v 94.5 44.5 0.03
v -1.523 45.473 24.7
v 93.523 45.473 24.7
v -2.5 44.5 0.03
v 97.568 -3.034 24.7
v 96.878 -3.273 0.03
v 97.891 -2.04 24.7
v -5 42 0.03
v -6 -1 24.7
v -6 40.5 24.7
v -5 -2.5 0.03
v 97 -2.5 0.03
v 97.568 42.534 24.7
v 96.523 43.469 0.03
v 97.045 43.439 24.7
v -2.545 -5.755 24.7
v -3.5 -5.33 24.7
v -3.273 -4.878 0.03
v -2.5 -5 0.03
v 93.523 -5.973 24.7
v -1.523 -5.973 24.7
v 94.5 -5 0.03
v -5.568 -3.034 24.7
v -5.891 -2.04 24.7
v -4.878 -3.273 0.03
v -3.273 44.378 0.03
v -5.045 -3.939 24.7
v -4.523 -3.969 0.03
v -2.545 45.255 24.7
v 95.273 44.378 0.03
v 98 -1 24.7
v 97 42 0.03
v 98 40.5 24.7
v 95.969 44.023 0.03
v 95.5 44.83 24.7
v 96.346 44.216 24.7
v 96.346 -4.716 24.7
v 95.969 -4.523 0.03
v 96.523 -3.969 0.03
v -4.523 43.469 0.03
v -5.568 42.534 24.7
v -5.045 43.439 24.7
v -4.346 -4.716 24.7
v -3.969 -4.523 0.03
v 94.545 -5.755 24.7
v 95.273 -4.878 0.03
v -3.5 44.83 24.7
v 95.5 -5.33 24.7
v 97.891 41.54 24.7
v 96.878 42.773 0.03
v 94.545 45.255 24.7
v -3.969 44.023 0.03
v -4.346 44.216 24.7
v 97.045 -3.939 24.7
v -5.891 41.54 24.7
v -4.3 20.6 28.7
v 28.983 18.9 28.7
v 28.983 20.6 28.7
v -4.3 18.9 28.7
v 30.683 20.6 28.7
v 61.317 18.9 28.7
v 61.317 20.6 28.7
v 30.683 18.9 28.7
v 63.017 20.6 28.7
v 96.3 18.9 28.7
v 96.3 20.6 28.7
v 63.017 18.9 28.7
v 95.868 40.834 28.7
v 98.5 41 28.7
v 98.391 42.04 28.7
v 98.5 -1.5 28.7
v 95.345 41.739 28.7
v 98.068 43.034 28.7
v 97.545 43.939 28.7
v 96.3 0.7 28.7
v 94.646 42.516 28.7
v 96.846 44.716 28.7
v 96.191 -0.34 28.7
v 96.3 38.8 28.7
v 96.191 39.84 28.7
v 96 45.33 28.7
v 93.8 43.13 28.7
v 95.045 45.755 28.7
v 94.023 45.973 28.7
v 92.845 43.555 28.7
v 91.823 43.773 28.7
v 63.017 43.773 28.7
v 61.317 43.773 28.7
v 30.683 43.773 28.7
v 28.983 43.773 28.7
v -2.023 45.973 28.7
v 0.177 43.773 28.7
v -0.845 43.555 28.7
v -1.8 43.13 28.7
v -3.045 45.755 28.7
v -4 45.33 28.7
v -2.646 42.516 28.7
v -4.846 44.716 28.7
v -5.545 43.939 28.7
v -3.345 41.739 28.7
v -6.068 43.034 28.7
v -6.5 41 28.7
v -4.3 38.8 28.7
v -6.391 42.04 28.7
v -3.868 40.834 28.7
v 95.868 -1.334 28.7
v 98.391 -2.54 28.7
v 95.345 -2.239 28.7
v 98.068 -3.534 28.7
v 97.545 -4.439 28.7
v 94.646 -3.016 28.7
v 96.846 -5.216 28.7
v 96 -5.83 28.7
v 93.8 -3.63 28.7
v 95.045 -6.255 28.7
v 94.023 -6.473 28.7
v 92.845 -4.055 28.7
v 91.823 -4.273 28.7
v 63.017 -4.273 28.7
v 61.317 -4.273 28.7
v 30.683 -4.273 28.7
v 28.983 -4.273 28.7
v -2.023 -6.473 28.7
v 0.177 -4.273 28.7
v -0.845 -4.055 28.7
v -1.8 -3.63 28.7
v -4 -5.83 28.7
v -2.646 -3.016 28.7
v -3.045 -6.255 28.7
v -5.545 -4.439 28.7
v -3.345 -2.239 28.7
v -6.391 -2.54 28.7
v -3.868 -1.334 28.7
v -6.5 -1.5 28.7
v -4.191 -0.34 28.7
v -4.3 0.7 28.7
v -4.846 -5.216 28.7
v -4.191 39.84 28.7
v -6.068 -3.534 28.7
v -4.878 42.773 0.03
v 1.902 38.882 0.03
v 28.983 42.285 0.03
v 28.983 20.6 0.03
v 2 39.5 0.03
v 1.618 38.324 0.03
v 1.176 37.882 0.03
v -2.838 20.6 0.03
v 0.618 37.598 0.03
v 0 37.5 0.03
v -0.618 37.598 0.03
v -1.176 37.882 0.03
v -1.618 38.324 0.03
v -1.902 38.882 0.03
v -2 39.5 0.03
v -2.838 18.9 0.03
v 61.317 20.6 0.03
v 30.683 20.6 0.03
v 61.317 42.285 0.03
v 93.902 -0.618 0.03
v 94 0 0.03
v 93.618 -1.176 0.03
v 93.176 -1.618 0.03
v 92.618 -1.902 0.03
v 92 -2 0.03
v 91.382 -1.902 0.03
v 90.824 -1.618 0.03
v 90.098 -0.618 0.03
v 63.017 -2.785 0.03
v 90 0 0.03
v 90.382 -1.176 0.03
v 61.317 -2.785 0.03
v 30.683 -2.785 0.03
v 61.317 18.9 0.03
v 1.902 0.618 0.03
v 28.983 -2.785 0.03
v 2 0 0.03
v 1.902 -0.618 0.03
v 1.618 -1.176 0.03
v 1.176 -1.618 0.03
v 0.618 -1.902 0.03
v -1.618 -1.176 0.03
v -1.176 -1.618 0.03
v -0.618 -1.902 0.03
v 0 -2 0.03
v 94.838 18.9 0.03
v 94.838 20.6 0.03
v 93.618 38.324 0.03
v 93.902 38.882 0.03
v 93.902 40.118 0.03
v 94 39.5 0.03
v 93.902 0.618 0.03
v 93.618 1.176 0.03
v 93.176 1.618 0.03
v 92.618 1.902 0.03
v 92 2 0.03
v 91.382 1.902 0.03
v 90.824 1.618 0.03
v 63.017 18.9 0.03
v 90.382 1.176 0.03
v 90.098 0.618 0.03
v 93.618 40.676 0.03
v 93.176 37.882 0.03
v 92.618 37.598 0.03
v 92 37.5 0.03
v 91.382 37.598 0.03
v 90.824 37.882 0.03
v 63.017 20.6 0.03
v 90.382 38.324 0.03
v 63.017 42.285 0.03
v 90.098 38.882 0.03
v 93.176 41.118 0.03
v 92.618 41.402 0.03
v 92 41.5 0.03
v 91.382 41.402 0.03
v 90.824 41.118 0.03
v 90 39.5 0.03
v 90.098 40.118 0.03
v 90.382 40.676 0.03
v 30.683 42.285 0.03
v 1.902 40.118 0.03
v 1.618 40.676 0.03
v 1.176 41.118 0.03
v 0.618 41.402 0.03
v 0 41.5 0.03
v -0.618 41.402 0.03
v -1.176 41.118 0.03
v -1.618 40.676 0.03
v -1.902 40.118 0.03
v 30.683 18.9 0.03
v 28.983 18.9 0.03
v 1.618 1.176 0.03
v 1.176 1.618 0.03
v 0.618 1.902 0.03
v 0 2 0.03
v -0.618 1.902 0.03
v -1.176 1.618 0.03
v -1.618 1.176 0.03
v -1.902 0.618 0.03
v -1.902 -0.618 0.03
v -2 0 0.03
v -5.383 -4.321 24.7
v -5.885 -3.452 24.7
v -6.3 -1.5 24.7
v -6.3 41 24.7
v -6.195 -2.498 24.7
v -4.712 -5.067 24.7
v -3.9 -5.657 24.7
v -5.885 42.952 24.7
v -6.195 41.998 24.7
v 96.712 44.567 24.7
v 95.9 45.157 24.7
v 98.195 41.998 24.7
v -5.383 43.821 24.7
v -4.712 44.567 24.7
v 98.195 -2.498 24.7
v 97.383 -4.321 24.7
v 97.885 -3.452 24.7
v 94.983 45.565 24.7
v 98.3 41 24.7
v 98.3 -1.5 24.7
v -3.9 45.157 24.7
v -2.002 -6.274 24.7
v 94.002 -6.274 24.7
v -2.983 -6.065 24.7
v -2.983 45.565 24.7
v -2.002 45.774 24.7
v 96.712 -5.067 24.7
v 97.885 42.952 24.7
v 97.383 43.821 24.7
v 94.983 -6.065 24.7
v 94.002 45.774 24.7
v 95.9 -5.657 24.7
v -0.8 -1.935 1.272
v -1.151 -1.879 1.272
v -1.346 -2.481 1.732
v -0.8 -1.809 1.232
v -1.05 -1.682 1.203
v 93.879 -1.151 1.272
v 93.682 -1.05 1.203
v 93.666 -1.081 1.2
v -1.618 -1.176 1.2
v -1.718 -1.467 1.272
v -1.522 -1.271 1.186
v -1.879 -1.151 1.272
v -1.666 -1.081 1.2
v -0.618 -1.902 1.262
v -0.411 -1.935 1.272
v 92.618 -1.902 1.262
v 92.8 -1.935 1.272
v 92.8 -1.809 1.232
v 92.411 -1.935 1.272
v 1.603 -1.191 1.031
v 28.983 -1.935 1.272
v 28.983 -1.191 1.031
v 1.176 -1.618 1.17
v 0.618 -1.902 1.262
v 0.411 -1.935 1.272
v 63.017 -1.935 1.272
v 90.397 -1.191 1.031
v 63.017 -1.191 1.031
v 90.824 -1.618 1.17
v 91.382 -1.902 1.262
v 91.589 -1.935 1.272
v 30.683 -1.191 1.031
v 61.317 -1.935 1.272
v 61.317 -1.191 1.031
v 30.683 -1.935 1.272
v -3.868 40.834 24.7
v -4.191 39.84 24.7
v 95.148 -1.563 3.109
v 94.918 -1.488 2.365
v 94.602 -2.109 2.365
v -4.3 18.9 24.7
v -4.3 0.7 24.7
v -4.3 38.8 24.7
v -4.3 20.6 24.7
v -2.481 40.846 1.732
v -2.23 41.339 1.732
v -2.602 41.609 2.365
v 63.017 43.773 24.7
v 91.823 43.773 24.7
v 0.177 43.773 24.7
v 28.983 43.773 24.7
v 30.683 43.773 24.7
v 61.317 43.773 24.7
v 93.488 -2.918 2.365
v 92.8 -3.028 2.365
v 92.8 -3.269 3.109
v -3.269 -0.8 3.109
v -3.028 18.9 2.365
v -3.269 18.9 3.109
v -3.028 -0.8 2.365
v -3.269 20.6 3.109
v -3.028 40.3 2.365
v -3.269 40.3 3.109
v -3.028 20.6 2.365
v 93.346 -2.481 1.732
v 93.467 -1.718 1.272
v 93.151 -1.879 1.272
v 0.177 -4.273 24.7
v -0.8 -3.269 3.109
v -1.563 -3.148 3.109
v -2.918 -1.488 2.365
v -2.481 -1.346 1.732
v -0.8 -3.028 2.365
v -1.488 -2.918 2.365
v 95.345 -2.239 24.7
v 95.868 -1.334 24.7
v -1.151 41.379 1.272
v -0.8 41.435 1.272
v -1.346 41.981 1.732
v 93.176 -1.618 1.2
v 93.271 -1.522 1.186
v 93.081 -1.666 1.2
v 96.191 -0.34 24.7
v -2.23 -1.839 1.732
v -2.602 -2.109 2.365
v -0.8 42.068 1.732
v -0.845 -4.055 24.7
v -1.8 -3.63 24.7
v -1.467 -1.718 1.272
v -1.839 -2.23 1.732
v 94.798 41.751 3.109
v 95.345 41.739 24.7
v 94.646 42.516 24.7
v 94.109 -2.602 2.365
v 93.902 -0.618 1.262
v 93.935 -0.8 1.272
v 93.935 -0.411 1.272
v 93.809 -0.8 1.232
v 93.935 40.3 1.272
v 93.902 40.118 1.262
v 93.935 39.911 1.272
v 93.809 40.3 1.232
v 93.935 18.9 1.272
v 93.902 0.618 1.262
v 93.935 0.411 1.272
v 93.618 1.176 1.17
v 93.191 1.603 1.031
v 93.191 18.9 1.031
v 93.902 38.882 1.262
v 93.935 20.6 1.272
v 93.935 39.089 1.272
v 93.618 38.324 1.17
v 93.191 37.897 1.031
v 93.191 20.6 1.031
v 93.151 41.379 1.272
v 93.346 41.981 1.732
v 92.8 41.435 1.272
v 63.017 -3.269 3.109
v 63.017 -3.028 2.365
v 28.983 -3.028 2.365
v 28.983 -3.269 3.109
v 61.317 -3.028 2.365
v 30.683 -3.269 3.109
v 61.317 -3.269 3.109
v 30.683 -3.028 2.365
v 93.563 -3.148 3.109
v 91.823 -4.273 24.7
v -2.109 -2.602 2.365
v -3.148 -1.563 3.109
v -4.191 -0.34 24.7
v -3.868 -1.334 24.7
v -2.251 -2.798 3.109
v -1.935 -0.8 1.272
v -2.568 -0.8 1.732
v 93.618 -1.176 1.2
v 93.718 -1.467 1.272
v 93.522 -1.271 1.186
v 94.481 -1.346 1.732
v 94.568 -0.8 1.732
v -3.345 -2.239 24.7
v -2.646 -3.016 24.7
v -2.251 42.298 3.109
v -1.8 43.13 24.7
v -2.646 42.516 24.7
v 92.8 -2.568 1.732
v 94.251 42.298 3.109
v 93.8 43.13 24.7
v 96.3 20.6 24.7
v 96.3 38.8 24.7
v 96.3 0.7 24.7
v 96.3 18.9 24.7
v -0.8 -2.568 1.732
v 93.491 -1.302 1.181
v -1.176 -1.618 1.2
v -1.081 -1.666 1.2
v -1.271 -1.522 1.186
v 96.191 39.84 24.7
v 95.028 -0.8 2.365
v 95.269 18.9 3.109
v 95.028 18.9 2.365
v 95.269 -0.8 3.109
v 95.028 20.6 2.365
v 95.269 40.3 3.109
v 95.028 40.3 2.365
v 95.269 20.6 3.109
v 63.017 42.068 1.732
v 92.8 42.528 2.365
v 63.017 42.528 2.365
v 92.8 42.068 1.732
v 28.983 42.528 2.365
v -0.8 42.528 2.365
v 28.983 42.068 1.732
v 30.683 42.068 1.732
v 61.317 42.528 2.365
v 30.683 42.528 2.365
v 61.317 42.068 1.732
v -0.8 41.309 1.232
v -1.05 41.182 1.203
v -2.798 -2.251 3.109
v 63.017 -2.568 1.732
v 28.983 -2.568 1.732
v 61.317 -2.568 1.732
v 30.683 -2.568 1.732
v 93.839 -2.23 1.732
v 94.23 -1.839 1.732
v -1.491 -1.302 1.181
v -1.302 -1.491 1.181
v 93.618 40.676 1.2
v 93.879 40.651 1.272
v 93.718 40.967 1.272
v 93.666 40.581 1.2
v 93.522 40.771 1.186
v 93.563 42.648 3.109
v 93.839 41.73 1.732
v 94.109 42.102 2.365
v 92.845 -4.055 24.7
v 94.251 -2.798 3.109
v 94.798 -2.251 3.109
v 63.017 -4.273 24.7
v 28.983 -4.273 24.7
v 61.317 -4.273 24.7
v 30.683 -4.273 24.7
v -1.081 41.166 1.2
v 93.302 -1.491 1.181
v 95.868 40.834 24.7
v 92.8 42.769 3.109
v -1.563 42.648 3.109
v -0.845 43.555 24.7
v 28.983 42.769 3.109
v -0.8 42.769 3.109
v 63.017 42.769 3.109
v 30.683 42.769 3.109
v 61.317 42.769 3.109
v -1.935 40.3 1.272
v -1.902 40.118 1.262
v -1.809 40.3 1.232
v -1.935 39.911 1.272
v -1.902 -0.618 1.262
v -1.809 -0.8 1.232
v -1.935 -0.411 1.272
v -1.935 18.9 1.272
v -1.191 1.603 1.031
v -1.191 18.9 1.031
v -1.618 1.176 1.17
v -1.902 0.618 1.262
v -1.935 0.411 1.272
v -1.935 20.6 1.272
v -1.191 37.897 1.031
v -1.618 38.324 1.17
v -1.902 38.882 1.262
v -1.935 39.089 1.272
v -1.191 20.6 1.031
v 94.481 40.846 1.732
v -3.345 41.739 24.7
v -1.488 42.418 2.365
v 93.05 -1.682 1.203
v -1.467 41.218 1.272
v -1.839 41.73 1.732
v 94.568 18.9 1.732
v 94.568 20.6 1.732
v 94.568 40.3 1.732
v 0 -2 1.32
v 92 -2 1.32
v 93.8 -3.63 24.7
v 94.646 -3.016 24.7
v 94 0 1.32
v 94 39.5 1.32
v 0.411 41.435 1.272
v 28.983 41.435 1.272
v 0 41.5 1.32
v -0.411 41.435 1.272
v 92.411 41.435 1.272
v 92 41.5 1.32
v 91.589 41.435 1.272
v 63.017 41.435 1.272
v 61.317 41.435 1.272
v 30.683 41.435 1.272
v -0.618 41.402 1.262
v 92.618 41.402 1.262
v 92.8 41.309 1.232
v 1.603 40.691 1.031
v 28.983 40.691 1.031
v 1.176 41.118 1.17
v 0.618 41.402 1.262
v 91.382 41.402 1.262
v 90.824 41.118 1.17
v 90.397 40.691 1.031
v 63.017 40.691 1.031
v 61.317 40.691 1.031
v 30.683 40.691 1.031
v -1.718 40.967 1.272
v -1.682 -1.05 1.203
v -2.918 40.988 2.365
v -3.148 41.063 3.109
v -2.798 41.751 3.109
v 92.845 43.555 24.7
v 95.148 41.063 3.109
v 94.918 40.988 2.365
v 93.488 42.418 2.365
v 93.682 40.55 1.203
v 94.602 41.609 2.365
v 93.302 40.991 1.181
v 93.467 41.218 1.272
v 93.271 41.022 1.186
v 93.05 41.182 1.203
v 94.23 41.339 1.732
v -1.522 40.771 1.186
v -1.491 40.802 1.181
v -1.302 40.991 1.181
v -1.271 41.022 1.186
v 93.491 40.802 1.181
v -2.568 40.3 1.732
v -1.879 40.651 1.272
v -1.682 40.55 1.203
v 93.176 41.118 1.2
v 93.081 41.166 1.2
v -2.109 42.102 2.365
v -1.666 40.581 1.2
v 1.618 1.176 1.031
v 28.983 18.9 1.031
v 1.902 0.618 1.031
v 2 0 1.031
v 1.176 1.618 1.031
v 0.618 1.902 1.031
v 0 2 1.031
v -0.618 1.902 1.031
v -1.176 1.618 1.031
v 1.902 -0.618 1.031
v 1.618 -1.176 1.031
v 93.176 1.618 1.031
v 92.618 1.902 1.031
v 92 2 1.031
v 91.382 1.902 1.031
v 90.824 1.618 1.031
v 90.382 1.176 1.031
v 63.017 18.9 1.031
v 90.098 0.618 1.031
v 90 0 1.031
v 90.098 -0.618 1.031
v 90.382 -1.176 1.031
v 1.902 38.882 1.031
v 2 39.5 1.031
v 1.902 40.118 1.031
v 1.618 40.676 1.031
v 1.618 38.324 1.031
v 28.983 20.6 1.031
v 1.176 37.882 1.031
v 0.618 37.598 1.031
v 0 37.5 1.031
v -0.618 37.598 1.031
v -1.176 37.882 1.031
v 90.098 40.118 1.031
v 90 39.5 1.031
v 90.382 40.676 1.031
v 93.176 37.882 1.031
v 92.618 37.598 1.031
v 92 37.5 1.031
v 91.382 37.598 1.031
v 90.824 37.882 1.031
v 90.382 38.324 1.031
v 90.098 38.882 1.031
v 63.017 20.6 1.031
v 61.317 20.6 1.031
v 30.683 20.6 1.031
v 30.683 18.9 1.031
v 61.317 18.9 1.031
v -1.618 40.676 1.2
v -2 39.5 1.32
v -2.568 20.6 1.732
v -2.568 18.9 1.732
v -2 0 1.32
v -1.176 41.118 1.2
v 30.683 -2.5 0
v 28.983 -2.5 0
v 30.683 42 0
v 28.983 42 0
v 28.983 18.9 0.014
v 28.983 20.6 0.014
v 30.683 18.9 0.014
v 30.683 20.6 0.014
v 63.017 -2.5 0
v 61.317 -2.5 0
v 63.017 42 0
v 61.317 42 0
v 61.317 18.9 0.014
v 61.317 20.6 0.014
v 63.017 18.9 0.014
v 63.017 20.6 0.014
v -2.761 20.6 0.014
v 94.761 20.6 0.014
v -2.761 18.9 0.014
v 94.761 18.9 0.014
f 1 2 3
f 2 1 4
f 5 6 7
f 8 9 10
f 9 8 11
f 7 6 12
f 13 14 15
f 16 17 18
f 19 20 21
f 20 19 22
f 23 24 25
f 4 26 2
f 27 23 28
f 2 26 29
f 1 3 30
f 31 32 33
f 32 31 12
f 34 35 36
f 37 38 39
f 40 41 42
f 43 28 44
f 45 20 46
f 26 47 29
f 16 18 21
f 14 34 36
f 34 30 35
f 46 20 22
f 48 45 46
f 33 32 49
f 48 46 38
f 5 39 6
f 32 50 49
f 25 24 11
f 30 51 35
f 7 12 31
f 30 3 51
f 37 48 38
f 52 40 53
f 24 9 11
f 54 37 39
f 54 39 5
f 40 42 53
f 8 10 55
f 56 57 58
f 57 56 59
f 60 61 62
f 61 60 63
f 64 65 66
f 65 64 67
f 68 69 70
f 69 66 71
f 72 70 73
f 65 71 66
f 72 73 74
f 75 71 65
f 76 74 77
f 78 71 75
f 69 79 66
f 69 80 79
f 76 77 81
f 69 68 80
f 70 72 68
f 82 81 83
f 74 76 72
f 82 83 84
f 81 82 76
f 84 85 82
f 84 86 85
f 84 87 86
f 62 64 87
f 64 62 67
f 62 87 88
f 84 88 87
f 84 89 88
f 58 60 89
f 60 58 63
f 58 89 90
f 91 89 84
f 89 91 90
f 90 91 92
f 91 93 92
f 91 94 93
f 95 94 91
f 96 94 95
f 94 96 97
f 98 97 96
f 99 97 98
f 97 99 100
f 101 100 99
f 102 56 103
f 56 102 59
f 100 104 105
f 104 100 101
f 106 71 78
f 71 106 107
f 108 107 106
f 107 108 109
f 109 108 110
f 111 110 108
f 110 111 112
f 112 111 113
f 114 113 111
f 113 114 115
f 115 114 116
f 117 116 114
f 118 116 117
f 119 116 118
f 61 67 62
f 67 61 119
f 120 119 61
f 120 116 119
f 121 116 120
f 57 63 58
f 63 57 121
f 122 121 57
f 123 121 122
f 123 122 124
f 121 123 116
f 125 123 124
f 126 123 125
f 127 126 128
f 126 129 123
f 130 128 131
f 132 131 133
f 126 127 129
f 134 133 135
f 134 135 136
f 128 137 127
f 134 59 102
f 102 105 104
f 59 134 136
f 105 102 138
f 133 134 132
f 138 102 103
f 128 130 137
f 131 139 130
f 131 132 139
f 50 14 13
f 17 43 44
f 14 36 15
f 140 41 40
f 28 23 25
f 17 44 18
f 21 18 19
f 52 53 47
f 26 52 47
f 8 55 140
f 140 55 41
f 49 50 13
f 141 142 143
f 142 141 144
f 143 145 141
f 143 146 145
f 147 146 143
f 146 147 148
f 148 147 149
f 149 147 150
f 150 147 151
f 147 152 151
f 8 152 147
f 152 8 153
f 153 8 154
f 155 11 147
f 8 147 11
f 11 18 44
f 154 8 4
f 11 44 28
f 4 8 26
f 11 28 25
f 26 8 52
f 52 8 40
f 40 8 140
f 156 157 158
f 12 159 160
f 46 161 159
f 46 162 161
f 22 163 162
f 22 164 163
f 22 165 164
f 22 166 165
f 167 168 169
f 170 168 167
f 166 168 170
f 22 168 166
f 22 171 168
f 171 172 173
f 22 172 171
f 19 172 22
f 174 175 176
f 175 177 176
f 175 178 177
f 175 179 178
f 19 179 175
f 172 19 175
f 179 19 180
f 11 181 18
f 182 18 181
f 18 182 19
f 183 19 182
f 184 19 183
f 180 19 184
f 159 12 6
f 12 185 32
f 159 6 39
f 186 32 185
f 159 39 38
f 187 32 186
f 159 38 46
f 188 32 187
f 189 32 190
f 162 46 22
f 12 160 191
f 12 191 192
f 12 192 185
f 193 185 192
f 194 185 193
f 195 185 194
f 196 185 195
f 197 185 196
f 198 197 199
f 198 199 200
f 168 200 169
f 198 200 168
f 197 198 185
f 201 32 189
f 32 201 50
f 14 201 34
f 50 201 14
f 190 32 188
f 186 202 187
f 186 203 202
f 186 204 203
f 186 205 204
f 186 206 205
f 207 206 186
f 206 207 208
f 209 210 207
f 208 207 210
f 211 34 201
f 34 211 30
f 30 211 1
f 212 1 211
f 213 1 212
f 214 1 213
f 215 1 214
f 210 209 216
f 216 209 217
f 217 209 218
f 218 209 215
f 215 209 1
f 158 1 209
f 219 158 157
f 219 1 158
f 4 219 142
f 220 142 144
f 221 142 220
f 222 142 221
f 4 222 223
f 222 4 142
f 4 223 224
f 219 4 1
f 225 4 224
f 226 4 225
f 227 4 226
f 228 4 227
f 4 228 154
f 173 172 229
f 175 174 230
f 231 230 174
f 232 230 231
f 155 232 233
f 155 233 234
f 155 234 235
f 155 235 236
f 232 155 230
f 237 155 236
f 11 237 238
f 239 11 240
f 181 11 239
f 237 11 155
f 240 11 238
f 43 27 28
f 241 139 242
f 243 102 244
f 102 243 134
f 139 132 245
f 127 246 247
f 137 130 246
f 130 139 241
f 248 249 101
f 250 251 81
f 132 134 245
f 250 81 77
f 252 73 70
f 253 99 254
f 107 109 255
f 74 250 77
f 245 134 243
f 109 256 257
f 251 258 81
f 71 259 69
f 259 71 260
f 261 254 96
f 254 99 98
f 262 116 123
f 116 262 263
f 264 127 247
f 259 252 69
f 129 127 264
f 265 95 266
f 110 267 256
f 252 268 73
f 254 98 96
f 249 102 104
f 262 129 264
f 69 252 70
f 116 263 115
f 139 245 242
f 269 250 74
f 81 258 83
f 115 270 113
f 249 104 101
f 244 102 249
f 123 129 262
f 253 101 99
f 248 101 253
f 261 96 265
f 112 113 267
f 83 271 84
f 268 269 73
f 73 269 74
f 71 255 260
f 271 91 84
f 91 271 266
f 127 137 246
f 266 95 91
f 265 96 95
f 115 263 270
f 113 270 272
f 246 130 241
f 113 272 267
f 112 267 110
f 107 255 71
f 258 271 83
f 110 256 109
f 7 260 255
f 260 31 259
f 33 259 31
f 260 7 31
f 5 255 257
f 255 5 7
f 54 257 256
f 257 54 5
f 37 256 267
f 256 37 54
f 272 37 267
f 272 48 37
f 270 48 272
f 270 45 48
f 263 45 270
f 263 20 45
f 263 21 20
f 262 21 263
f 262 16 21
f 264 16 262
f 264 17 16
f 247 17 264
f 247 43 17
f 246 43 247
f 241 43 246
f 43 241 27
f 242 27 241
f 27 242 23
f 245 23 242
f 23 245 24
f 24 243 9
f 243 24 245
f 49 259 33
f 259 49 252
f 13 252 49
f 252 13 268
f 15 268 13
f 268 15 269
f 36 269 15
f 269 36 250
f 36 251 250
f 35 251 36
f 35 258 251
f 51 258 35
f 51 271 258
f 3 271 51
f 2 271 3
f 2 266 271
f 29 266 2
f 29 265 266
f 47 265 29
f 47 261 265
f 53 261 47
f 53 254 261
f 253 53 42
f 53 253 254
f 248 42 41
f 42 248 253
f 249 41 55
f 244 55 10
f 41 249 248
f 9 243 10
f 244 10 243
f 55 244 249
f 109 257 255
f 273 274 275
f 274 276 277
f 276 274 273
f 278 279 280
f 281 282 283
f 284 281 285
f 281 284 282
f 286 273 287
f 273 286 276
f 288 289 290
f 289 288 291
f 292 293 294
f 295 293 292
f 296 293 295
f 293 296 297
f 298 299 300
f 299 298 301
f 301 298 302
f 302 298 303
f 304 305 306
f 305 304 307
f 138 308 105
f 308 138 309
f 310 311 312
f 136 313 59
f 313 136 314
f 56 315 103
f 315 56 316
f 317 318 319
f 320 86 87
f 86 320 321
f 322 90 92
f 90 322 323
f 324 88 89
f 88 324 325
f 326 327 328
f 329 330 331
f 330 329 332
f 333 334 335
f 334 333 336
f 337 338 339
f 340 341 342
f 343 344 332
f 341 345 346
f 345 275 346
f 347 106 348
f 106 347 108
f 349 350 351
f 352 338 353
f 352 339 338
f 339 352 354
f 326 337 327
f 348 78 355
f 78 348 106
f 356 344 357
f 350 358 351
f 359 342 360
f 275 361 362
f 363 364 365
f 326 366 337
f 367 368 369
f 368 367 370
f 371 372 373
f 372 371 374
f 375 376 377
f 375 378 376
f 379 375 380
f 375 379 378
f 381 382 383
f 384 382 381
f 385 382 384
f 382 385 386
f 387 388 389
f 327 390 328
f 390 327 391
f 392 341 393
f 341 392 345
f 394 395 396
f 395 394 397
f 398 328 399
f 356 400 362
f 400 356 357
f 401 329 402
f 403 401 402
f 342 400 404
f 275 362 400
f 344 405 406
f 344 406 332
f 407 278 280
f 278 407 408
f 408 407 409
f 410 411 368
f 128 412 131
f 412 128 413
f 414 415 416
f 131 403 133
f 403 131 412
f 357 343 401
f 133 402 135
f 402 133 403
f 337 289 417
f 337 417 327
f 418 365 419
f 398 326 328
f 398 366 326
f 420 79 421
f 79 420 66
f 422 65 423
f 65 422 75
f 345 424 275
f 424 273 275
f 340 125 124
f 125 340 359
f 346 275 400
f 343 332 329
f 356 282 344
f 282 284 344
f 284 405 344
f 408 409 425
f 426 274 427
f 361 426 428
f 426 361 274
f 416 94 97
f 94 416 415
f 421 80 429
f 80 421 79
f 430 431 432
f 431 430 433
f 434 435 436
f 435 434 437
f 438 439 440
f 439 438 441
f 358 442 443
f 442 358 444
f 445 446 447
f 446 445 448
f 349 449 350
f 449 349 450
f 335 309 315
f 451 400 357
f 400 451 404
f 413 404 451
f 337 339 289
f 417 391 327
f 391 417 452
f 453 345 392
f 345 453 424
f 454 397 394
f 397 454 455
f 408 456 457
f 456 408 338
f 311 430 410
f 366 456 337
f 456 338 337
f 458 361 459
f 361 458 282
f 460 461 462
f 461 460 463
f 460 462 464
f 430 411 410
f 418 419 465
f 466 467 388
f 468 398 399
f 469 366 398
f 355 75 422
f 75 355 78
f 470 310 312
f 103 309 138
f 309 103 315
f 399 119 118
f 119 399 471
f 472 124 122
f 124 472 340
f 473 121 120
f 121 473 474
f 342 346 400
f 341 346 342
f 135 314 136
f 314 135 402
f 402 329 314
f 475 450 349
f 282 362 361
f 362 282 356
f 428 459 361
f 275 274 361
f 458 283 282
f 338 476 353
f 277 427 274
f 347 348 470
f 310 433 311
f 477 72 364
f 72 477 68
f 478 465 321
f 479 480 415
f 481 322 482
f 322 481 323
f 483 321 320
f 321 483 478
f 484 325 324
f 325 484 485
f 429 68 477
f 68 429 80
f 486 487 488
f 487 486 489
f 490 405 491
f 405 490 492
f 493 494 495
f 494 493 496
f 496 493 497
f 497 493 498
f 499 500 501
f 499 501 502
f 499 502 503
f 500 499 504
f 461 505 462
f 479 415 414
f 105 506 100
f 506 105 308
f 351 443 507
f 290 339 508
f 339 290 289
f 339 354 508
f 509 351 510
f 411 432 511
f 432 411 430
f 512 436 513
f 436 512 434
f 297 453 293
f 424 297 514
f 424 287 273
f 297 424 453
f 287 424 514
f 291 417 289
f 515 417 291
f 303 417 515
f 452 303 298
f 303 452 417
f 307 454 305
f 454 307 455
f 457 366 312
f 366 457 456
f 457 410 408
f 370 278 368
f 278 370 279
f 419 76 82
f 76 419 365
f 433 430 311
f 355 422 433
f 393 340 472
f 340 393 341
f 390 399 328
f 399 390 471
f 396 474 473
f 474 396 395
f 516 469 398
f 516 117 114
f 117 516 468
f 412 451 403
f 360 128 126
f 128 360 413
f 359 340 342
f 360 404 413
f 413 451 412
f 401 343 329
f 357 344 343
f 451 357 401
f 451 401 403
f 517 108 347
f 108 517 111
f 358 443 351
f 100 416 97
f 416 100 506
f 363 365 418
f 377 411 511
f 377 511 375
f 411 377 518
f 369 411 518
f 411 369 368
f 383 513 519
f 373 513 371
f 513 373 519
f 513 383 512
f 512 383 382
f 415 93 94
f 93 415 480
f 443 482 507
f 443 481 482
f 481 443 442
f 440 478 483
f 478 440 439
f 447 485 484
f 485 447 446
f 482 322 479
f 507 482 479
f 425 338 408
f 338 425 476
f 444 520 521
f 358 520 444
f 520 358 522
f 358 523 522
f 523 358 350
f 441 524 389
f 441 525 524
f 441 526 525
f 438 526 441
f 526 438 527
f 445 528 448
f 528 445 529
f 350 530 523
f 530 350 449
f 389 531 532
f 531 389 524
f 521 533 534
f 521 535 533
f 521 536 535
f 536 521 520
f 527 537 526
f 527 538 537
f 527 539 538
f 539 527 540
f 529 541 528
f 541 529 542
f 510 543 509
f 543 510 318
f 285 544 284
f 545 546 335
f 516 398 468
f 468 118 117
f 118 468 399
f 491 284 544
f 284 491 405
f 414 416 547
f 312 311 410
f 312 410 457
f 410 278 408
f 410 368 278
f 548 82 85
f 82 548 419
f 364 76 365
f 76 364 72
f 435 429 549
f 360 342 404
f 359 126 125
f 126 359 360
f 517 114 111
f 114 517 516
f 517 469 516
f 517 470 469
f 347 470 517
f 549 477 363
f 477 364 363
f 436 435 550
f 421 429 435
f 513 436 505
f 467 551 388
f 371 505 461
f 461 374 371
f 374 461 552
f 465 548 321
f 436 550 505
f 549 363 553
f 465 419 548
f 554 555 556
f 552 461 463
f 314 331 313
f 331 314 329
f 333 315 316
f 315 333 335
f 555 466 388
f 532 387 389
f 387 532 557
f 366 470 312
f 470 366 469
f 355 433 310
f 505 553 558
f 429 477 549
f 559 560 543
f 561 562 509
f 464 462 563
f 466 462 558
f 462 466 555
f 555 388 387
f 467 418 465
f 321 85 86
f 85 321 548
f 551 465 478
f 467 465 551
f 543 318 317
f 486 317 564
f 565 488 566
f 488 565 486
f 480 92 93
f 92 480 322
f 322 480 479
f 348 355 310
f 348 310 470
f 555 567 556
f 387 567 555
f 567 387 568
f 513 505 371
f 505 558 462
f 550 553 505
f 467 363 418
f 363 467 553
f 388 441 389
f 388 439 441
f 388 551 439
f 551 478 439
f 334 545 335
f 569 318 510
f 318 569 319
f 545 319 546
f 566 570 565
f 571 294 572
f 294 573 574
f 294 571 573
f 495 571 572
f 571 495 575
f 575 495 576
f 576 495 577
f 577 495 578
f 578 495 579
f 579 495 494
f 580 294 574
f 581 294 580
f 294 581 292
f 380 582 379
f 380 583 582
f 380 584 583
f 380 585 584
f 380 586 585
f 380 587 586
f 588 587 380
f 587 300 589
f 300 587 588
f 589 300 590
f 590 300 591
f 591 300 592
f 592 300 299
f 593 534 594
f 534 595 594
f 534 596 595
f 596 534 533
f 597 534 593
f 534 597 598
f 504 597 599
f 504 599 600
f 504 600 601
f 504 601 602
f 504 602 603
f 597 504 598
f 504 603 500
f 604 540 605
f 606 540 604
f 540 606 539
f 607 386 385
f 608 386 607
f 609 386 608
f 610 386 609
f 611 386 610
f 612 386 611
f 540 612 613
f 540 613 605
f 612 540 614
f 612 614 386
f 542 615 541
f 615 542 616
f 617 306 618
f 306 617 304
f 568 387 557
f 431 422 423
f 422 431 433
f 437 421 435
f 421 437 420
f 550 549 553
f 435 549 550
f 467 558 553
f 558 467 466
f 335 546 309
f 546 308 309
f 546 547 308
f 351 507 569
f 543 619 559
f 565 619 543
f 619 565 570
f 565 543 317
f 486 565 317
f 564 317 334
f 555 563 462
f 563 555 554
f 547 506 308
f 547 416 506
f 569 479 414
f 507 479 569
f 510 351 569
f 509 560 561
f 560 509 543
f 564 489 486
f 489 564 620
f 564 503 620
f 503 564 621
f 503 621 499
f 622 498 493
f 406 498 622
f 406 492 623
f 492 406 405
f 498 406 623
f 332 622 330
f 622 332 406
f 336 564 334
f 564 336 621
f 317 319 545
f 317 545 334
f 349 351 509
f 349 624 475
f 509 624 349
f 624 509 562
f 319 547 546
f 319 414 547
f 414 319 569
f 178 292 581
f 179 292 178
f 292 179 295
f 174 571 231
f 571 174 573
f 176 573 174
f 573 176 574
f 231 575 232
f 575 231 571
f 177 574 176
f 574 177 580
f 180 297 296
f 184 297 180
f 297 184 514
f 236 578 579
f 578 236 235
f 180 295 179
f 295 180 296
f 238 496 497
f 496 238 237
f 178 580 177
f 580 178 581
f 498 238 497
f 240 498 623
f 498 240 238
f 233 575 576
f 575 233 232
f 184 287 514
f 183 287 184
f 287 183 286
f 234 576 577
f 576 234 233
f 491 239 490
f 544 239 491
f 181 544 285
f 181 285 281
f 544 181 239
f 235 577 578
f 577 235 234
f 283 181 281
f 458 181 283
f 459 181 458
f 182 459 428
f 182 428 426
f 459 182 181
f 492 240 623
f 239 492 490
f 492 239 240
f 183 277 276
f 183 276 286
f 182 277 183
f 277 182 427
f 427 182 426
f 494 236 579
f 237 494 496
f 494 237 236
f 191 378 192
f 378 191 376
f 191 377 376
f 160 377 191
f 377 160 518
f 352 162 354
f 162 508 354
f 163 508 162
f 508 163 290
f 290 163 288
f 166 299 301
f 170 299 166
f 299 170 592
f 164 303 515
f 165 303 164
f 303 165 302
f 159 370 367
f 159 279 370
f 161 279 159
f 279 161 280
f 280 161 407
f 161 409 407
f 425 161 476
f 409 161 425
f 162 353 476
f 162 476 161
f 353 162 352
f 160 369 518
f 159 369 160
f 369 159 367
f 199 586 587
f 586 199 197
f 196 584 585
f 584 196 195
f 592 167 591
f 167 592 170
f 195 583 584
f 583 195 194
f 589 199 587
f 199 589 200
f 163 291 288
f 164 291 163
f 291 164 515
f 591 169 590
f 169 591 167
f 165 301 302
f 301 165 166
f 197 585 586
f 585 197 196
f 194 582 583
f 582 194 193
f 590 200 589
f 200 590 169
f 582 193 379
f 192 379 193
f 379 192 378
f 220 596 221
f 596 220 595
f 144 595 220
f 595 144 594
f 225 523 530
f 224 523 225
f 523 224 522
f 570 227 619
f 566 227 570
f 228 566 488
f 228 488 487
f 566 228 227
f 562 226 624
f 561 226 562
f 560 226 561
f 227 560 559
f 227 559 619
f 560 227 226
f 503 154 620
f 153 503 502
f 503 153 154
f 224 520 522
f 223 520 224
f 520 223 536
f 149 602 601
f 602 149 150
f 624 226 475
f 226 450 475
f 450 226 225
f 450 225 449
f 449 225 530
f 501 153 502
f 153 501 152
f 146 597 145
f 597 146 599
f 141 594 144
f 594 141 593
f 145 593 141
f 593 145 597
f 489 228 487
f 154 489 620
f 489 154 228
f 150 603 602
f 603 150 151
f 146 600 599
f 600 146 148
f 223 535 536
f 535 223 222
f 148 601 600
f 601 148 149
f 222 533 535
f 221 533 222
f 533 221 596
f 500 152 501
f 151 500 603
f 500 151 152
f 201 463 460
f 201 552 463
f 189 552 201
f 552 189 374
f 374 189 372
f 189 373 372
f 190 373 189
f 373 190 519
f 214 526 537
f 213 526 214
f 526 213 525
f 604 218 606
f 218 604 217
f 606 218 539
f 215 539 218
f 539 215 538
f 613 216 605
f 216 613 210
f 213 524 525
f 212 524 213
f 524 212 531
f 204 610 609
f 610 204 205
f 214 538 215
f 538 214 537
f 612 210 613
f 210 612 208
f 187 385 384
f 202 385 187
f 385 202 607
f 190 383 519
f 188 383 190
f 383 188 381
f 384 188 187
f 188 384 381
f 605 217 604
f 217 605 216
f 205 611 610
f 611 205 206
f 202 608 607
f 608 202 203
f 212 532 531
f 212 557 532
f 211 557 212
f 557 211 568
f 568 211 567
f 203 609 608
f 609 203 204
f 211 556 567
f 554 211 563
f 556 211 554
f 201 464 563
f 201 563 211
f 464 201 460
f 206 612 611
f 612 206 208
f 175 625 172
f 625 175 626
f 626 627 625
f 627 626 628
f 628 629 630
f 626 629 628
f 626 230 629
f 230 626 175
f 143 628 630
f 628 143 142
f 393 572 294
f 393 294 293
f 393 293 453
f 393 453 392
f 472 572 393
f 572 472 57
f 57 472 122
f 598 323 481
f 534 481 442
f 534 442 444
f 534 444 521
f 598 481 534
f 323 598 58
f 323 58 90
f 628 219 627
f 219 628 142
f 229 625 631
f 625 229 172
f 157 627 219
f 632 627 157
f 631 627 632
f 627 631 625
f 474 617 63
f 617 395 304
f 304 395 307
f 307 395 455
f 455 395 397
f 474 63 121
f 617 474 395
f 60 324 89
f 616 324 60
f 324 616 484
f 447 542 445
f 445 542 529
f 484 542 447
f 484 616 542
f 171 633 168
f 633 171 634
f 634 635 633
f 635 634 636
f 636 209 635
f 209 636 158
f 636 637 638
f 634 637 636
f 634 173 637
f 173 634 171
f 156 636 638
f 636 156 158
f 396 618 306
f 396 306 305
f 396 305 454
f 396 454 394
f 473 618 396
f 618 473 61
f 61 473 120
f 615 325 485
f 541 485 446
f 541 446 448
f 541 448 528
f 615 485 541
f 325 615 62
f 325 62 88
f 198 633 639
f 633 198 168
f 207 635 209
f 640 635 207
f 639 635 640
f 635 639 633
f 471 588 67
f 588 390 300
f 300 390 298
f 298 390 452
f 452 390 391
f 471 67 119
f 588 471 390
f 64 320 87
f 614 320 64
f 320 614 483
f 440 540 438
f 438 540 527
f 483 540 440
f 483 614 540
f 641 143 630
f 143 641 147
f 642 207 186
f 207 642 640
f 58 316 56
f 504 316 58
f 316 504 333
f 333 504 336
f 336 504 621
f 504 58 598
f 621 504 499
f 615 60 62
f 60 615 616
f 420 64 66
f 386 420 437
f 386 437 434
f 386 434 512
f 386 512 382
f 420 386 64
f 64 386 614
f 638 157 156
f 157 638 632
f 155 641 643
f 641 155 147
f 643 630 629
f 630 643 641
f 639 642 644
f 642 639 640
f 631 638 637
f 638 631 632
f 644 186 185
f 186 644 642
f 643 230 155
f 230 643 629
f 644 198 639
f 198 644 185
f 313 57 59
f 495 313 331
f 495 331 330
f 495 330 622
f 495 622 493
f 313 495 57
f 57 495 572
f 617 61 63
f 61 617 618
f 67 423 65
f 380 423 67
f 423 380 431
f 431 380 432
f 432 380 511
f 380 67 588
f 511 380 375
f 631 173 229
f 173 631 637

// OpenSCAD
// created by pretenda
// http://www.thingiverse.com/pretenda/designs
// modified by skytale
// http://www.thingiverse.com/skytale/designs

// If you are reading this, sorry for my spaghetti code.
// skytale :>> also sorry for mine

// Options!
//cube([39.5,92,50]);
/* [T-Boxx Insert] */
// What do you want to render out?
what = "boxx"; // [boxx:Boxx Insert,pegs:Pegs,both:Both Boxx Insert and Pegs]
// Which height?
h = "halfSize"; // [fullSize:fullSize,halfSize:halfSize]
// How many units wide?
modulesH = 2; // [1:8]
// How many units deep?
modulesV = 1; // [1:6]
// How many compartments in width?
numberOfHorizontalDivisions = 3; // [1:10]
// How many compartments in depth?
numberOfVerticalDivisions = 2; // [1:10]

/* [Misc Parameters] */
// Wall Thickness. Too thin and it is a bit flimsy, 1.7 seems about right for me.
wallThickness = 1.7;
// Peg Diameter. This width for me is quite snug, might need to dial it down depending on your printer.
pegDiameter = 7.4;

/* [Hidden] */
pegDistance = 39.5; //92 for two -- so 13 difference
baseCornerDiameter = 5;
topCornerDiameter = 10;
topWidth = 52.5;
topLowerWidth = 51.5;
topInnerDiameter = 48.5;
bottomWidth = 49.5;
height = (h == "fullSize")? 60.7:28.7; 
// fullSize: 63-2.3 for pegs
// halfSize: 31-2.3 for pegs



pegSlackH = (modulesH - 1) * 13;
pegSlackV = (modulesV - 1) * 13;

blPosX = 0;
blPosY = 0;

brPosX = modulesH * pegDistance + pegSlackH;
brPosY = 0;

tlPosX = 0;
tlPosY = modulesV * pegDistance + pegSlackV;

trPosX = modulesH * pegDistance + pegSlackH;
trPosY = modulesV * pegDistance + pegSlackV;

// Pegs?!
/*translate([0,0,-2]) {
cylinder(2, pegDiameter / 2, pegDiameter / 2);
translate([brPosX, 0, 0]) cylinder(2, pegDiameter / 2, pegDiameter / 2);
translate([0, tlPosY, 0]) cylinder(2, pegDiameter / 2, pegDiameter / 2);
translate([trPosX, trPosY, 0]) cylinder(2, pegDiameter / 2, pegDiameter / 2);
}*/

module boxx()
{

difference()
{

union()
{
hull()
{

translate([-(bottomWidth - pegDistance) / 2 + baseCornerDiameter / 2, -(bottomWidth - pegDistance) / 2 + baseCornerDiameter / 2, 0.03]) #cylinder(2, baseCornerDiameter/2,baseCornerDiameter/2, $fn = 20);


translate([brPosX, brPosY, 0]) translate([(bottomWidth - pegDistance) / 2 - baseCornerDiameter / 2, -(bottomWidth - pegDistance) / 2 + baseCornerDiameter / 2, 0.03]) #cylinder(2, baseCornerDiameter/2,baseCornerDiameter/2, $fn = 20);

translate([tlPosX, tlPosY, 0]) translate([-(bottomWidth - pegDistance) / 2 + baseCornerDiameter / 2, (bottomWidth - pegDistance) / 2 - baseCornerDiameter / 2, 0.03]) #cylinder(2, baseCornerDiameter/2,baseCornerDiameter/2, $fn = 20);

translate([trPosX, trPosY, 0]) translate([(bottomWidth - pegDistance) / 2 - baseCornerDiameter / 2, (bottomWidth - pegDistance) / 2 - baseCornerDiameter / 2, 0.03]) #cylinder(2, baseCornerDiameter/2,baseCornerDiameter/2, $fn = 20);

// Bottom
translate([blPosX, blPosY, height]) translate([-(topLowerWidth - pegDistance) / 2 + topCornerDiameter / 2, -(topLowerWidth - pegDistance) / 2 + topCornerDiameter / 2, -4]) cylinder(4, topCornerDiameter / 2, topCornerDiameter / 2, $fn = 30);

translate([brPosX, brPosY, height]) translate([(topLowerWidth - pegDistance) / 2 - topCornerDiameter / 2, -(topLowerWidth - pegDistance) / 2 + topCornerDiameter / 2, -4]) cylinder(4, topCornerDiameter / 2, topCornerDiameter / 2, $fn = 30);

translate([tlPosX, tlPosY, height]) translate([-(topLowerWidth - pegDistance) / 2 + topCornerDiameter / 2, (topLowerWidth - pegDistance) / 2 - topCornerDiameter / 2, -4]) cylinder(4, topCornerDiameter / 2, topCornerDiameter / 2, $fn = 30);

translate([trPosX, trPosY, height]) translate([(topLowerWidth - pegDistance) / 2 - topCornerDiameter / 2, (topLowerWidth - pegDistance) / 2 - topCornerDiameter / 2, -4]) cylinder(4, topCornerDiameter / 2, topCornerDiameter / 2, $fn = 30);
}


hull()
{


translate([blPosX, blPosY, height]) translate([-(topWidth - pegDistance) / 2 + topCornerDiameter / 2, -(topWidth - pegDistance) / 2 + topCornerDiameter / 2, -4]) cylinder(4, topCornerDiameter / 2 -0.2, topCornerDiameter / 2, $fn = 30);

translate([brPosX, brPosY, height]) translate([(topWidth - pegDistance) / 2 - topCornerDiameter / 2, -(topWidth - pegDistance) / 2 + topCornerDiameter / 2, -4]) cylinder(4, topCornerDiameter / 2 -0.2, topCornerDiameter / 2, $fn = 30);

translate([tlPosX, tlPosY, height]) translate([-(topWidth - pegDistance) / 2 + topCornerDiameter / 2, (topWidth - pegDistance) / 2 - topCornerDiameter / 2, -4]) cylinder(4, topCornerDiameter / 2 -0.2, topCornerDiameter / 2, $fn = 30);

translate([trPosX, trPosY, height]) translate([(topWidth - pegDistance) / 2 - topCornerDiameter / 2, (topWidth - pegDistance) / 2 - topCornerDiameter / 2, -4]) cylinder(4, topCornerDiameter / 2 -0.2, topCornerDiameter / 2, $fn = 30);

}
}




 // inside carved out
hull()
{
translate([blPosX +wallThickness, blPosY + wallThickness, 1]) translate([-(bottomWidth - pegDistance) / 2 + baseCornerDiameter / 2, -(bottomWidth - pegDistance) / 2 + baseCornerDiameter / 2, baseCornerDiameter / 2]) sphere(baseCornerDiameter/2, $fn = 20);

translate([brPosX - wallThickness, brPosY + wallThickness, 1]) translate([(bottomWidth - pegDistance) / 2 - baseCornerDiameter / 2, -(bottomWidth - pegDistance) / 2 + baseCornerDiameter / 2, baseCornerDiameter / 2]) sphere(baseCornerDiameter/2, $fn = 20);

translate([tlPosX + wallThickness, tlPosY - wallThickness, 1]) translate([-(bottomWidth - pegDistance) / 2 + baseCornerDiameter / 2, (bottomWidth - pegDistance) / 2 - baseCornerDiameter / 2, baseCornerDiameter / 2]) sphere(baseCornerDiameter/2, $fn = 20);

translate([trPosX - wallThickness, trPosY - wallThickness, 1]) translate([(bottomWidth - pegDistance) / 2 - baseCornerDiameter / 2, (bottomWidth - pegDistance) / 2 - baseCornerDiameter / 2, baseCornerDiameter / 2]) sphere(baseCornerDiameter/2, $fn = 20);

// Bottom
translate([blPosX + wallThickness, blPosY + wallThickness, height]) translate([-(topLowerWidth - pegDistance) / 2 + topCornerDiameter / 2, -(topLowerWidth - pegDistance) / 2 + topCornerDiameter / 2, -4]) cylinder(5, topCornerDiameter / 2, topCornerDiameter / 2, $fn = 30);

translate([brPosX - wallThickness, brPosY + wallThickness, height]) translate([(topLowerWidth - pegDistance) / 2 - topCornerDiameter / 2, -(topLowerWidth - pegDistance) / 2 + topCornerDiameter / 2, -4]) cylinder(5, topCornerDiameter / 2, topCornerDiameter / 2, $fn = 30);

translate([tlPosX + wallThickness, tlPosY - wallThickness, height]) translate([-(topLowerWidth - pegDistance) / 2 + topCornerDiameter / 2, (topLowerWidth - pegDistance) / 2 - topCornerDiameter / 2, -4]) cylinder(5, topCornerDiameter / 2, topCornerDiameter / 2, $fn = 30);

translate([trPosX - wallThickness, trPosY- wallThickness, height]) translate([(topLowerWidth - pegDistance) / 2 - topCornerDiameter / 2, (topLowerWidth - pegDistance) / 2 - topCornerDiameter / 2, -4]) cylinder(5, topCornerDiameter / 2, topCornerDiameter / 2, $fn = 30);
}


// Holes for pegs to slot into

cylinder(20, 2, 2, $fn = 20);
translate([brPosX, 0, 0]) cylinder(20, 2, 2, $fn = 20);
translate([0, tlPosY, 0]) cylinder(20, 2, 2, $fn = 20);
translate([trPosX, trPosY, 0]) cylinder(20, 2, 2, $fn = 20);

}
}




module peg() {
union()
{
cylinder(2, pegDiameter/2, pegDiameter/2, $fn = 20);
translate([0,0,1]) cylinder(2, 1.8, 1.8, $fn = 20);
}
}


if (what == "boxx" || what == "both")
{
// Boxx!

boxx();
makeDivisions();

}

if (what == "pegs" || what == "both")
{
// Pegs!
translate([-20,0,0]) {
translate([0, 0, 0]) peg();
translate([0, pegDiameter + 2, 0]) peg();
translate([0, (pegDiameter+2)*2, 0]) peg();
translate([0, (pegDiameter+2)*3, 0]) peg();
}

}

// SUBDIVISIONS

rim = 0;
module makeDivisions(){
 if(numberOfVerticalDivisions >= 2){
  for (i = [1 : numberOfVerticalDivisions-1]){
	vDevide(((tlPosY + (bottomWidth - pegDistance) / 2) / numberOfVerticalDivisions) * i);
	//vDevide(0);
	//vDevide(tlPosY + (bottomWidth - pegDistance) / 2);
  }
 }
 if(numberOfHorizontalDivisions >= 2){
  for (i = [1 : numberOfHorizontalDivisions-1]){
  	hDevide(((brPosX + (bottomWidth - pegDistance) / 2) / numberOfHorizontalDivisions) * i);
	//hDevide(0);
	//hDevide(brPosX + (bottomWidth - pegDistance) / 2);
  }
 }
}

module vDevide(pos){
translate([0,pos,0])
hull()
{
translate([-(bottomWidth - pegDistance) / 2 + baseCornerDiameter / 2, -(bottomWidth - pegDistance) / 2 + baseCornerDiameter / 2, baseCornerDiameter / 2]) 
	rotate([90,0,0]) translate([0,0,-wallThickness/2]) cylinder(wallThickness, baseCornerDiameter / 2, baseCornerDiameter / 2, $fn = 30);
translate([brPosX, 0, 0]) translate([(bottomWidth - pegDistance) / 2 - baseCornerDiameter / 2, -(bottomWidth - pegDistance) / 2 + baseCornerDiameter / 2, baseCornerDiameter / 2]) 
	rotate([90,0,0]) translate([0,0,-wallThickness/2]) cylinder(wallThickness, baseCornerDiameter / 2, baseCornerDiameter / 2, $fn = 30);
translate([blPosX, 0, height]) translate([-(topLowerWidth - pegDistance) / 2, -(bottomWidth - pegDistance) / 2 + baseCornerDiameter / 2, -rim])
	translate([wallThickness/2, 0, -wallThickness/2]) cube(size = [wallThickness, wallThickness, wallThickness], center = true);
translate([brPosX, 0, height]) translate([(topLowerWidth - pegDistance) / 2, -(bottomWidth - pegDistance) / 2 + baseCornerDiameter / 2, -rim])
	translate([-wallThickness/2, 0, -wallThickness/2]) cube(size = [wallThickness, wallThickness, wallThickness], center = true);
}
}

module hDevide(pos){
translate([pos,0,0])
hull()
{
translate([-(bottomWidth - pegDistance) / 2 + baseCornerDiameter / 2, -(bottomWidth - pegDistance) / 2 + baseCornerDiameter / 2, baseCornerDiameter / 2]) 
	rotate([0,-90,0]) translate([0,0,-wallThickness/2]) cylinder(wallThickness, baseCornerDiameter / 2, baseCornerDiameter / 2, $fn = 30);
translate([0, tlPosY, 0]) translate([-(bottomWidth - pegDistance) / 2 + baseCornerDiameter / 2, (bottomWidth - pegDistance) / 2 - baseCornerDiameter / 2, baseCornerDiameter / 2])
	rotate([0,-90,0]) translate([0,0,-wallThickness/2]) cylinder(wallThickness, baseCornerDiameter / 2, baseCornerDiameter / 2, $fn = 30);
translate([0, tlPosY, height]) translate([-(bottomWidth - pegDistance) / 2 + baseCornerDiameter / 2, (topLowerWidth - pegDistance) / 2, -rim])
	translate([0, -wallThickness/2, -wallThickness/2]) cube(size = [wallThickness, wallThickness, wallThickness], center = true);
translate([0, blPosY, height]) translate([-(bottomWidth - pegDistance) / 2 + baseCornerDiameter / 2, -(topLowerWidth - pegDistance) / 2, -rim])
	translate([0, wallThickness/2, -wallThickness/2]) cube(size = [wallThickness, wallThickness, wallThickness], center = true);
}
}
